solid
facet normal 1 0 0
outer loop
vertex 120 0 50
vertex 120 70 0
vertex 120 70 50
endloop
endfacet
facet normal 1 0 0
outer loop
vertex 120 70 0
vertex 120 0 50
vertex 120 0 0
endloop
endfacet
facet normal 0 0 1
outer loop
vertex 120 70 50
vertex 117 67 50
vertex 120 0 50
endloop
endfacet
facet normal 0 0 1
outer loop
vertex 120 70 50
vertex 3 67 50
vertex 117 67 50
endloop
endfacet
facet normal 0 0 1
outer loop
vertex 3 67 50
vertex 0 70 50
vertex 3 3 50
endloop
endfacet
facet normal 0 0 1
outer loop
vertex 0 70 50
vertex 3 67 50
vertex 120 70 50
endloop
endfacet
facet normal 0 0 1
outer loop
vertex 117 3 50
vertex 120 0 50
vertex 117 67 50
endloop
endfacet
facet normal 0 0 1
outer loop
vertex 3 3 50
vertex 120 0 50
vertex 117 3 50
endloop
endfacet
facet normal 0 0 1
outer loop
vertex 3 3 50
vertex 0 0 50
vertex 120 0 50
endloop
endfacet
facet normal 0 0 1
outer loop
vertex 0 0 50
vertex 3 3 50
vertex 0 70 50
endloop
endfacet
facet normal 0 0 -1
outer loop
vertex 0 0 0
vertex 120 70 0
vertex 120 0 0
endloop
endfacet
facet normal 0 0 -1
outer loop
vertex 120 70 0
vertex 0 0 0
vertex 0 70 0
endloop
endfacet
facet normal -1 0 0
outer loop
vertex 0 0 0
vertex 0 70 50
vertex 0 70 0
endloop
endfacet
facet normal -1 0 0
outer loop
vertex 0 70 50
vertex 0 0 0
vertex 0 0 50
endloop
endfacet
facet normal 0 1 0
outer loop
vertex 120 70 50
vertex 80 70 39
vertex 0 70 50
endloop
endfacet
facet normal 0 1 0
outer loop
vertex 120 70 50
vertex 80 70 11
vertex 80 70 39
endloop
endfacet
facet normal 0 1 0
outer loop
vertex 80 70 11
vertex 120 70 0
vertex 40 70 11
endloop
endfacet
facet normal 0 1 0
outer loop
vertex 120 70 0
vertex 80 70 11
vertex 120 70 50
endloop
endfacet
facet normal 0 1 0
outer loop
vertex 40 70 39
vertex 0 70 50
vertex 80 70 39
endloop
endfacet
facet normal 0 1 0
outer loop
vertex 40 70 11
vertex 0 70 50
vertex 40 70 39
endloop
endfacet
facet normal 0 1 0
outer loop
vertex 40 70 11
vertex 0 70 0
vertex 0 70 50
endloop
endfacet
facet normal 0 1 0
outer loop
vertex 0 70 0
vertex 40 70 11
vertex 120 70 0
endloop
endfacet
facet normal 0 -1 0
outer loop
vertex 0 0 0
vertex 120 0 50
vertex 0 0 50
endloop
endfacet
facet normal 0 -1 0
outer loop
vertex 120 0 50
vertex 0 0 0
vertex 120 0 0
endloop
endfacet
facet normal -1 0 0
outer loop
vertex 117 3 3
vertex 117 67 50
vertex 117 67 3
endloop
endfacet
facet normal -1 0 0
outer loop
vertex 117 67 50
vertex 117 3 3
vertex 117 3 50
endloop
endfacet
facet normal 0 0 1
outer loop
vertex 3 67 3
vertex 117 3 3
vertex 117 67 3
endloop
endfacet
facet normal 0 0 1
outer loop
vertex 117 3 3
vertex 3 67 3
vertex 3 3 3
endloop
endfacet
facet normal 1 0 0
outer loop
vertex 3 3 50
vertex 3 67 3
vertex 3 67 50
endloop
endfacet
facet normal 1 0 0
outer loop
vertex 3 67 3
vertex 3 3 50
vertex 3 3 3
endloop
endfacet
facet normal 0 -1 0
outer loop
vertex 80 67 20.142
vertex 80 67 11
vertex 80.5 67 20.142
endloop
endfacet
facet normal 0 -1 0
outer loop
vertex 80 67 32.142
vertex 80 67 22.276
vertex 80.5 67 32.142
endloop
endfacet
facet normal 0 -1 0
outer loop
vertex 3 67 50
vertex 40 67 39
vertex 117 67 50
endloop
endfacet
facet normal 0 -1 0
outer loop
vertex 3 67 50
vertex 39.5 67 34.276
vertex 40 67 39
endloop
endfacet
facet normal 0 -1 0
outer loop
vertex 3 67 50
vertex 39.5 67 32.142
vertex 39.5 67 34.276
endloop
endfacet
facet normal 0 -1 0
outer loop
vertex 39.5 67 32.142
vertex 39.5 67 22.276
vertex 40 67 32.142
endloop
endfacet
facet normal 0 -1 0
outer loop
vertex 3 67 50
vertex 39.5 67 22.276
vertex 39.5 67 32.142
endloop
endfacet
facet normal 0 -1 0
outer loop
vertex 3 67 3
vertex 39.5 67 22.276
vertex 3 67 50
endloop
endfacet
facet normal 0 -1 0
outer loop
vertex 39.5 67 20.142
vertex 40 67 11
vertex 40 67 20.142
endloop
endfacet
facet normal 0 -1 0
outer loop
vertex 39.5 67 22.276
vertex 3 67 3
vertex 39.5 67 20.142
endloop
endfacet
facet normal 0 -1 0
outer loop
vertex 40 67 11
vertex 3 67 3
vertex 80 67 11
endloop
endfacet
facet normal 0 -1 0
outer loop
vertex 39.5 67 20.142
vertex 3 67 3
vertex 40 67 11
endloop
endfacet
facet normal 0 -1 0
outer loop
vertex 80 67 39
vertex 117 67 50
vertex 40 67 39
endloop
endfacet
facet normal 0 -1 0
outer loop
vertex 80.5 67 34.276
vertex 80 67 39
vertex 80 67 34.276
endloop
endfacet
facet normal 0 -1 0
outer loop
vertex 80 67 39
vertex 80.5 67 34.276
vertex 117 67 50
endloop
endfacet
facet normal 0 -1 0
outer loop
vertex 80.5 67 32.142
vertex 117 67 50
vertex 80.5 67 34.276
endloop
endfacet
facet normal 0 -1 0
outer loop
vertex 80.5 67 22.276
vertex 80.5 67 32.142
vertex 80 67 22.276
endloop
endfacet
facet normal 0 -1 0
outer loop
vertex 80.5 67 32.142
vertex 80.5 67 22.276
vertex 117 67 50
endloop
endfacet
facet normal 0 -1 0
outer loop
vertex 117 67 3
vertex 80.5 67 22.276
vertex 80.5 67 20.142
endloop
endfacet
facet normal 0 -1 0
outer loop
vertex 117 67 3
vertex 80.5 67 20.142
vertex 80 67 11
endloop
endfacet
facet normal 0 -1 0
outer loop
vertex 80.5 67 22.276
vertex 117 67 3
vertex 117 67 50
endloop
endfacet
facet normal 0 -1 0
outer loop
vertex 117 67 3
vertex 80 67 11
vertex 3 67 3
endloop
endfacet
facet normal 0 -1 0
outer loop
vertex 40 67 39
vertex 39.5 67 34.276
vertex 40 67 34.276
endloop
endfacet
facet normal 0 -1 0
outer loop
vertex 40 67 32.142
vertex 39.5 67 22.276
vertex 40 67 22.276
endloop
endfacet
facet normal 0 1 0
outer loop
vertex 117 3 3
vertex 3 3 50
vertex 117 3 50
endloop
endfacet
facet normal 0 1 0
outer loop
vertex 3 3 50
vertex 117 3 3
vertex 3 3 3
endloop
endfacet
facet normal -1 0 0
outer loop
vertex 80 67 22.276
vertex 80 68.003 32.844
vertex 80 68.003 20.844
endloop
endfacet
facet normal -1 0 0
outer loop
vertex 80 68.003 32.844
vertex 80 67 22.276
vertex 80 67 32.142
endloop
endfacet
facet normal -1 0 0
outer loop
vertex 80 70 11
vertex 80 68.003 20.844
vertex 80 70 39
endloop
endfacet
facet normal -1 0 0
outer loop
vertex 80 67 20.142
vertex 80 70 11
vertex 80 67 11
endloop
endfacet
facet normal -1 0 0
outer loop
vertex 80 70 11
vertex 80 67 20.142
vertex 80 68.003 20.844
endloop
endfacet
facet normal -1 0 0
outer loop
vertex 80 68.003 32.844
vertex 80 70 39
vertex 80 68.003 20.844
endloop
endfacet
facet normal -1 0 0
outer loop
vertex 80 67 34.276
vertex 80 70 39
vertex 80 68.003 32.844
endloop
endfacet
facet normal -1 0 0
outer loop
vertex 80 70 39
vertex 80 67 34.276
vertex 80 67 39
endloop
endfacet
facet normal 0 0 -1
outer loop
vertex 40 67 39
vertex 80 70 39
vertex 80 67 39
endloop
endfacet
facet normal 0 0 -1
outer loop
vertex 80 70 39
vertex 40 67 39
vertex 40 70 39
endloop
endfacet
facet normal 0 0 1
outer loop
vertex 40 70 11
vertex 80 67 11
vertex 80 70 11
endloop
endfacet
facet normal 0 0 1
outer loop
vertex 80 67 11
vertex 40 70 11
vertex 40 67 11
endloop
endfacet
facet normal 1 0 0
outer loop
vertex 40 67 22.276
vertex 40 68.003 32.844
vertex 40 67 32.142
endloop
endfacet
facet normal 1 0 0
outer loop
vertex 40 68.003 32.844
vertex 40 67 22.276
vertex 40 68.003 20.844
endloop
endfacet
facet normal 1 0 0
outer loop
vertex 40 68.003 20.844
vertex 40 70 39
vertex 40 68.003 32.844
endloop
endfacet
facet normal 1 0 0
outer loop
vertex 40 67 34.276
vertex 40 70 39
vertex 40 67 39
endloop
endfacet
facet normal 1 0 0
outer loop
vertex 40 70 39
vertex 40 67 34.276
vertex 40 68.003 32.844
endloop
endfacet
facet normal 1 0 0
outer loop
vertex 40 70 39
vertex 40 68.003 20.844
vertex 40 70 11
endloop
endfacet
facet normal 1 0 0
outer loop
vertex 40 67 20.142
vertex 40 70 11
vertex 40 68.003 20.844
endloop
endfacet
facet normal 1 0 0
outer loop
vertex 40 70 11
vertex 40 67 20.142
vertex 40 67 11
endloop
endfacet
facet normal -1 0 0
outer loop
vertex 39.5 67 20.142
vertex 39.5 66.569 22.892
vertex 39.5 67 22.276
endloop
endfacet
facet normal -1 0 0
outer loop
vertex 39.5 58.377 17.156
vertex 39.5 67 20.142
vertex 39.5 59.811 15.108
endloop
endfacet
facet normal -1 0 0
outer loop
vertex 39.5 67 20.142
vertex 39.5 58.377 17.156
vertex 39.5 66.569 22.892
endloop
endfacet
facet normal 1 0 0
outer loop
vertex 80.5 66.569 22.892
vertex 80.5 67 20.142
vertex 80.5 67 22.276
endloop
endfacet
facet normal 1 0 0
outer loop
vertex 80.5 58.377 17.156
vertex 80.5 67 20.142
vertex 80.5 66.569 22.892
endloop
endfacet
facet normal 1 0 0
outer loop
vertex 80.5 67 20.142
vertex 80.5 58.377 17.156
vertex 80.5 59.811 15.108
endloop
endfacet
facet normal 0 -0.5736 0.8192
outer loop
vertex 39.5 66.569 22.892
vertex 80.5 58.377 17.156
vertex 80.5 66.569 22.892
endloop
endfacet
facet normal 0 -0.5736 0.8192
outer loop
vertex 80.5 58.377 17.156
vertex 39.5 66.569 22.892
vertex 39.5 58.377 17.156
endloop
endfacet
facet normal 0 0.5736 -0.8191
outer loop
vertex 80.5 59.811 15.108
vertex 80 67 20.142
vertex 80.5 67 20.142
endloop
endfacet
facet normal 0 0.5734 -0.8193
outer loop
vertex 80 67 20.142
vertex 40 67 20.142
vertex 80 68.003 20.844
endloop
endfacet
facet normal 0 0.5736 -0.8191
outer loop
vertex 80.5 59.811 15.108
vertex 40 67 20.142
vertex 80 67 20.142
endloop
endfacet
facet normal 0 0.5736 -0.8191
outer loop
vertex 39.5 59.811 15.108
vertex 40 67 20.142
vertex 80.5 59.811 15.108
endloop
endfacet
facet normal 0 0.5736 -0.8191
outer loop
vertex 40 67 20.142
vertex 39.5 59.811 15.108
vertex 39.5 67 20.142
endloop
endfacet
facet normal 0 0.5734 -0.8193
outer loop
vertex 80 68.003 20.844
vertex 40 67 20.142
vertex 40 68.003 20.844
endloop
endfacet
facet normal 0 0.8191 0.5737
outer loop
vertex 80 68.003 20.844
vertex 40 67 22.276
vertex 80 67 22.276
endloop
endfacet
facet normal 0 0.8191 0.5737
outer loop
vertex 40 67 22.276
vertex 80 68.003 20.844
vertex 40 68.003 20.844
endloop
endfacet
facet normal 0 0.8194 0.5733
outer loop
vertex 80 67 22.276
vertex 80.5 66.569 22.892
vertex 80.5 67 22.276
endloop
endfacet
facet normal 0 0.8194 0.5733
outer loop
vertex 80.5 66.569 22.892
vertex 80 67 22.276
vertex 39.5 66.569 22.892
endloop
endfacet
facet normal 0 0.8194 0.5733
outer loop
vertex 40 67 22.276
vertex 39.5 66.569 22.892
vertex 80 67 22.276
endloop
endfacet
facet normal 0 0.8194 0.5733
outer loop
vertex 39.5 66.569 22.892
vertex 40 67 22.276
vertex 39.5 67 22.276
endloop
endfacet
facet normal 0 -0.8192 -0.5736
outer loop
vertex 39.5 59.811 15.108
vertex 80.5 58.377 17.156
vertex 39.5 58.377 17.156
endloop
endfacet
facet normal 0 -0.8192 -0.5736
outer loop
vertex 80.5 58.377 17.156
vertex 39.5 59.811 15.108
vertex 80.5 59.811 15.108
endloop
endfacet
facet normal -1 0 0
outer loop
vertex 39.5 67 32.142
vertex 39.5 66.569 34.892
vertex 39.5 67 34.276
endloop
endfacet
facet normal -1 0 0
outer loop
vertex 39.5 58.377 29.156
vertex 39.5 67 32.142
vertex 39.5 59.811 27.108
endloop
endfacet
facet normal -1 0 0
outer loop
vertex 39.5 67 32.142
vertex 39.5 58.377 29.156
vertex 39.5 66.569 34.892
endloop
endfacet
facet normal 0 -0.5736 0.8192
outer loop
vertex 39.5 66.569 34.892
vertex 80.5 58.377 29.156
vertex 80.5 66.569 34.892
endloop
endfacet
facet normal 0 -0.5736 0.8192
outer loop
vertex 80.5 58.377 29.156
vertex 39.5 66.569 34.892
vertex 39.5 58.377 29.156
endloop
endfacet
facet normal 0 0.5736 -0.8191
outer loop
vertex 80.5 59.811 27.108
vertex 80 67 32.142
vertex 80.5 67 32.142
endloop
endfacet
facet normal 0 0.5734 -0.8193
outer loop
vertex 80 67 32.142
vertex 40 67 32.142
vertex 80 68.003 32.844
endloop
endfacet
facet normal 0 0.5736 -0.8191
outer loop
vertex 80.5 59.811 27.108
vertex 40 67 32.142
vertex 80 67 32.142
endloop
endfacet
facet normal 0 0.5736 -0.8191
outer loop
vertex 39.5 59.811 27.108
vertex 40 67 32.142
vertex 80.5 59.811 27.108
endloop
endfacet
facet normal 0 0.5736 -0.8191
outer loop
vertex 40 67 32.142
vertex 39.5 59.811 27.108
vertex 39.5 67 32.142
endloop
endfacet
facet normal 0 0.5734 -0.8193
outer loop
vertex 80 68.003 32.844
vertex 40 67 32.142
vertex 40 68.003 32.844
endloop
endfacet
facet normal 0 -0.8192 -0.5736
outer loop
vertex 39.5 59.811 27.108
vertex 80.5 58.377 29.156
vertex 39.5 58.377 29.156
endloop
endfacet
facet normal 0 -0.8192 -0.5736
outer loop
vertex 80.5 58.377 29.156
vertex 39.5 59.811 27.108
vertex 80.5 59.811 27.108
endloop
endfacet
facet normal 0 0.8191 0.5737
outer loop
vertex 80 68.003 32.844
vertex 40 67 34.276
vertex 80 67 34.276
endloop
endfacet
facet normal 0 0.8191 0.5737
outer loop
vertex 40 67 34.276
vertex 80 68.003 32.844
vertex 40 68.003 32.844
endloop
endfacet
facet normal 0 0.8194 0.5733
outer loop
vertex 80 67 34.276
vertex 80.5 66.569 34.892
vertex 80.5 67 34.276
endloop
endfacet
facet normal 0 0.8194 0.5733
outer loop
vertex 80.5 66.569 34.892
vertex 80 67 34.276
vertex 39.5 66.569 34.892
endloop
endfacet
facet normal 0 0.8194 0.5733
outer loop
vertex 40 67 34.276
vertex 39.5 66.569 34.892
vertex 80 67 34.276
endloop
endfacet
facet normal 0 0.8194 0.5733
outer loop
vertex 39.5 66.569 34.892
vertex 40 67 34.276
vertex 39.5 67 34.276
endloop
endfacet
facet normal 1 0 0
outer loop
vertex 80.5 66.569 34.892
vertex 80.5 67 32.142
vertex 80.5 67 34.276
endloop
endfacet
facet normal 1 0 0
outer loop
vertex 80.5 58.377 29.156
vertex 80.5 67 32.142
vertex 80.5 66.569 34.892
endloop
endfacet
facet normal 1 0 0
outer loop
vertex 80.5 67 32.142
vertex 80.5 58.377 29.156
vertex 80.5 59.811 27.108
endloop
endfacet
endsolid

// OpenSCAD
$fn = 32;

// ----------------------------------------------------------------------
// Vent box: louvers enclosure
// ----------------------------------------------------------------------

// --- parameters (mm) ---
box_l = 120;              // box length, X
box_w = 70;               // box width, Y
box_h = 50;               // box height, Z
wall_t = 3;               // shell wall thickness
win_l = 40;               // vent window width, X
win_h = 28;               // vent window height, Z
slat_t = 2.5;             // louver slat thickness
slat_d = 10;              // louver slat depth
slat_a = 35;              // louver slat angle, degrees
slat_pitch = 12;          // louver pitch
slat_yc = 63.19;          // slat centreline Y

win_z0 = (box_h - win_h) / 2;  // window lower edge Z
n_slats = 2;  // louver count
slat_z0 = win_z0 + (win_h - (n_slats - 1) * slat_pitch) / 2;

difference() {
  union() {
    difference() {
      cube([box_l, box_w, box_h]);
  translate([wall_t, wall_t, wall_t])
    cube([box_l - 2 * wall_t, box_w - 2 * wall_t, box_h]);
  translate([(box_l - win_l) / 2, box_w - wall_t - 1, win_z0])
    cube([win_l, wall_t + 2, win_h]);
    }
    for (i = [0 : n_slats - 1])
      translate([box_l / 2, slat_yc, slat_z0 + i * slat_pitch])
        rotate([slat_a, 0, 0])
          cube([win_l + 1, slat_d, slat_t], center = true);
  }
}
